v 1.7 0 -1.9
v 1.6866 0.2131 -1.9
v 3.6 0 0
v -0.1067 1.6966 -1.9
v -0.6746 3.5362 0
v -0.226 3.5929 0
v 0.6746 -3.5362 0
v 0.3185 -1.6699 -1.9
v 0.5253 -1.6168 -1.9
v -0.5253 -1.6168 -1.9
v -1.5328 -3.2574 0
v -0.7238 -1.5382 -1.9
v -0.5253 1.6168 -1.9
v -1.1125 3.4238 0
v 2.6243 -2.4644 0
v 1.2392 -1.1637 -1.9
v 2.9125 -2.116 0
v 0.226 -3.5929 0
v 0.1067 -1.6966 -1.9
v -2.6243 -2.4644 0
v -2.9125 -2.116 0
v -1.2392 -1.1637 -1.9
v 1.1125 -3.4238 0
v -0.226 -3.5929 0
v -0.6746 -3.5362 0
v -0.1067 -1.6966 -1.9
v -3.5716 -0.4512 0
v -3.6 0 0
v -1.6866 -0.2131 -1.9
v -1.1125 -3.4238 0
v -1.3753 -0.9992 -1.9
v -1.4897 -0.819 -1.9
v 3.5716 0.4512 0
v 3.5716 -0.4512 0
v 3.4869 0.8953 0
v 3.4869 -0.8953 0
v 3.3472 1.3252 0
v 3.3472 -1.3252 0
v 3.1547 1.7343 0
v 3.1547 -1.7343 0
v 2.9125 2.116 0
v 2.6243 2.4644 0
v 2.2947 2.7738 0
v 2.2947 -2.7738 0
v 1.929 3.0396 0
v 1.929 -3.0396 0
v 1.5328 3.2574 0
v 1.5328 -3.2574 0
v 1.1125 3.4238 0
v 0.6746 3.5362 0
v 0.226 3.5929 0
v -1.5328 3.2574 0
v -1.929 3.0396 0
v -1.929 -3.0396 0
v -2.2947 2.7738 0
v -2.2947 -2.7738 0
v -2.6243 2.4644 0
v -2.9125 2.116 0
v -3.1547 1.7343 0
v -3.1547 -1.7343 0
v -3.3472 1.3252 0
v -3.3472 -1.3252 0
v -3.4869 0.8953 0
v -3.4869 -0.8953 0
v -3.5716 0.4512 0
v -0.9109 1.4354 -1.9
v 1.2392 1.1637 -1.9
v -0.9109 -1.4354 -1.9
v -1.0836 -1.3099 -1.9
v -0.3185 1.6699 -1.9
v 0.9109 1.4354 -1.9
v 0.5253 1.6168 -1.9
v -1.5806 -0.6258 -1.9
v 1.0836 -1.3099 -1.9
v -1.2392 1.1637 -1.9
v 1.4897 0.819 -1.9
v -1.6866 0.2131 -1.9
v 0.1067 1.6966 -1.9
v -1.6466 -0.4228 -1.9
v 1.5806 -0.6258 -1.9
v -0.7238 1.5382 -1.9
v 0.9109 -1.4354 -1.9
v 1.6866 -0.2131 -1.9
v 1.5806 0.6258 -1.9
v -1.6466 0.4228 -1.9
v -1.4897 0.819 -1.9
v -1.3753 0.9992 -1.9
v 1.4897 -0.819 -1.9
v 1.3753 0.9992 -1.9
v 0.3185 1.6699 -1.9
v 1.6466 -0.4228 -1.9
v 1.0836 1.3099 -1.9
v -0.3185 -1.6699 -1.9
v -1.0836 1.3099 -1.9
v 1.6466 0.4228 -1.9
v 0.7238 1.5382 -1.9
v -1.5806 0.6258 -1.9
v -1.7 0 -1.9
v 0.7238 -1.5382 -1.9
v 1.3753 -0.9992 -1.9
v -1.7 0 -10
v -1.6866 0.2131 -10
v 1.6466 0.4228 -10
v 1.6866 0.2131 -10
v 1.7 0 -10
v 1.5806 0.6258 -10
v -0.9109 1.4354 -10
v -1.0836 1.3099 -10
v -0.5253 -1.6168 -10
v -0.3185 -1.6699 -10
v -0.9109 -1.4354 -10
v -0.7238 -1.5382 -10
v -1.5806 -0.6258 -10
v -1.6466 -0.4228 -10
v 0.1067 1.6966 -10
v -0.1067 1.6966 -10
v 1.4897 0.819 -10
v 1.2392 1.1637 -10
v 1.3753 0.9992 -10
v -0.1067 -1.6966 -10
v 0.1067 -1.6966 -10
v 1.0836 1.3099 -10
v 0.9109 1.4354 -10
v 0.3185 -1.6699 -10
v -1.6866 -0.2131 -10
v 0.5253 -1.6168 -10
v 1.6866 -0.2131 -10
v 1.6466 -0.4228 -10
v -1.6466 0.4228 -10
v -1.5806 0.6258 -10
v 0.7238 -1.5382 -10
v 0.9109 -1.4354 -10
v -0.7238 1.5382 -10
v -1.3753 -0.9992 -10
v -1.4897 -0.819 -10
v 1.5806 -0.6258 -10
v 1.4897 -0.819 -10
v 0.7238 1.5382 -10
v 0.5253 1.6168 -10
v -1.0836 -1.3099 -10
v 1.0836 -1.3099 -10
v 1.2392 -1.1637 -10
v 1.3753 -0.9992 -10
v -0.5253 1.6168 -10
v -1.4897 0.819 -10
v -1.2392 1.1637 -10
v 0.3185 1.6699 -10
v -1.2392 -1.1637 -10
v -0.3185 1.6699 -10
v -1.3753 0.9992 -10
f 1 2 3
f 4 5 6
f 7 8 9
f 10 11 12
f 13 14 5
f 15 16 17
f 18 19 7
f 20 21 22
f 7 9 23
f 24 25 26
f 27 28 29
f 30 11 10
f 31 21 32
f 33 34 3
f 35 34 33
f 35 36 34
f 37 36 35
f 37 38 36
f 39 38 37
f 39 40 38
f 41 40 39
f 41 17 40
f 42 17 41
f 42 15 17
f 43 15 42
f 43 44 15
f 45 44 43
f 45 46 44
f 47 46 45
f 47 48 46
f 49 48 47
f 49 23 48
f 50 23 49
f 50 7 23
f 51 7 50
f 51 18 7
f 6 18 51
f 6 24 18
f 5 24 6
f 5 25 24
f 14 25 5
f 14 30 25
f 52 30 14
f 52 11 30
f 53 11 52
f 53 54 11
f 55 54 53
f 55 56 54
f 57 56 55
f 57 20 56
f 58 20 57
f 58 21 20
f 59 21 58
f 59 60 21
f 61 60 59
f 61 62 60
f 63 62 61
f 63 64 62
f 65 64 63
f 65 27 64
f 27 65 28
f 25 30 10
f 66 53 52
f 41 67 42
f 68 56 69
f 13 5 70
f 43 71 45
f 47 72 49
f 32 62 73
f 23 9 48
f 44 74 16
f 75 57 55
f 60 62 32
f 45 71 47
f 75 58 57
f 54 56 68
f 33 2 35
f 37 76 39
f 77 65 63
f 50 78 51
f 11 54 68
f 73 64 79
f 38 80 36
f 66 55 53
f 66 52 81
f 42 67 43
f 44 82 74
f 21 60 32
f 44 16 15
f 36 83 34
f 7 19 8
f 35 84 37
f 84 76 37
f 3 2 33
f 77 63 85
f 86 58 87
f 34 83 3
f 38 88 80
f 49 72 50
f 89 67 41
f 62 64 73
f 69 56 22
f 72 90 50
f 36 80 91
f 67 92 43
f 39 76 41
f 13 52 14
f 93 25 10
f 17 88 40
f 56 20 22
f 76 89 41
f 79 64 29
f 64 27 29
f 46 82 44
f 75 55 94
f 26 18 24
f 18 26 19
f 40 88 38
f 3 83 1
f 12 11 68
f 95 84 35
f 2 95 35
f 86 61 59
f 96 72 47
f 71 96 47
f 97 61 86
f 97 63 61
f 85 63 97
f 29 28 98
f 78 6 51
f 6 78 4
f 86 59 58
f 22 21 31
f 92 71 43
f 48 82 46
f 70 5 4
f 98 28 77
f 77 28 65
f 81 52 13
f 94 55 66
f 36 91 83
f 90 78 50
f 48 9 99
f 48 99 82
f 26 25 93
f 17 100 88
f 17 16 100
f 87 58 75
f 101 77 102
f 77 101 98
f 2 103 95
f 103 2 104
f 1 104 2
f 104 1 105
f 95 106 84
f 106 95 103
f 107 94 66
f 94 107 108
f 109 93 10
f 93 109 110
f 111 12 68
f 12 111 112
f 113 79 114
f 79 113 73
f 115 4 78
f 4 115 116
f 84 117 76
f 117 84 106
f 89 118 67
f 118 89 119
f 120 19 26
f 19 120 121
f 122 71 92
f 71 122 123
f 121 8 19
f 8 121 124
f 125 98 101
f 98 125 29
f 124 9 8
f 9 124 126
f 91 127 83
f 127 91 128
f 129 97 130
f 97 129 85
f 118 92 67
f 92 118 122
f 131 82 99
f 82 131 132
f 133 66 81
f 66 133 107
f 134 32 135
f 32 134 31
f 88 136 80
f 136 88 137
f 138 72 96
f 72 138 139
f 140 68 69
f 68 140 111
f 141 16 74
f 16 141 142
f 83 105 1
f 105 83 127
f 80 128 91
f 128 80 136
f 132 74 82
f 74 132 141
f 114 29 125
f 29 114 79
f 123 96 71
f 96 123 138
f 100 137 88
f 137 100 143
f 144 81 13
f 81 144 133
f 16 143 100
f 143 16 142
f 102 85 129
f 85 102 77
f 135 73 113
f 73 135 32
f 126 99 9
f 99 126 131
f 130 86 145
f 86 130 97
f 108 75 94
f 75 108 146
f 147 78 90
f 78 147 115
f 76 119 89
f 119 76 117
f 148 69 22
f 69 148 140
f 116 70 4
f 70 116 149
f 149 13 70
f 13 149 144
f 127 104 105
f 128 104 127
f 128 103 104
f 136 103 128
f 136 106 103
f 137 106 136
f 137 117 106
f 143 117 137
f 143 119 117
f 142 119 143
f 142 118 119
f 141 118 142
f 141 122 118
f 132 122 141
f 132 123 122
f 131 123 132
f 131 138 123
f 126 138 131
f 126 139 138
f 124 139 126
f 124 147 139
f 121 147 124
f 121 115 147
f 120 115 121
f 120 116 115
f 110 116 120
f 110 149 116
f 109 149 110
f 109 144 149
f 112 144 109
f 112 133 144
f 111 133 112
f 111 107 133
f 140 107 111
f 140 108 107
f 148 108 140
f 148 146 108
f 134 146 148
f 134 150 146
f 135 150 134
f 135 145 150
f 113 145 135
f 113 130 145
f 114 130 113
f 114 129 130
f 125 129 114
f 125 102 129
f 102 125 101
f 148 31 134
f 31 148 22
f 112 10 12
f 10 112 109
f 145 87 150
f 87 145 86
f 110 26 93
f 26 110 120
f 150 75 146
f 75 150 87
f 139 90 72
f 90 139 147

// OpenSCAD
$fn = 50;


difference() {
	union() {
		translate(v = [0, 0, -1.9000000000]) {
			rotate(a = [0, 0, 0]) {
				cylinder(h = 1.9000000000, r1 = 1.7000000000, r2 = 3.6000000000);
			}
		}
		translate(v = [0, 0, -10]) {
			rotate(a = [0, 0, 0]) {
				cylinder(h = 10, r = 1.7000000000);
			}
		}
	}
	union();
}
